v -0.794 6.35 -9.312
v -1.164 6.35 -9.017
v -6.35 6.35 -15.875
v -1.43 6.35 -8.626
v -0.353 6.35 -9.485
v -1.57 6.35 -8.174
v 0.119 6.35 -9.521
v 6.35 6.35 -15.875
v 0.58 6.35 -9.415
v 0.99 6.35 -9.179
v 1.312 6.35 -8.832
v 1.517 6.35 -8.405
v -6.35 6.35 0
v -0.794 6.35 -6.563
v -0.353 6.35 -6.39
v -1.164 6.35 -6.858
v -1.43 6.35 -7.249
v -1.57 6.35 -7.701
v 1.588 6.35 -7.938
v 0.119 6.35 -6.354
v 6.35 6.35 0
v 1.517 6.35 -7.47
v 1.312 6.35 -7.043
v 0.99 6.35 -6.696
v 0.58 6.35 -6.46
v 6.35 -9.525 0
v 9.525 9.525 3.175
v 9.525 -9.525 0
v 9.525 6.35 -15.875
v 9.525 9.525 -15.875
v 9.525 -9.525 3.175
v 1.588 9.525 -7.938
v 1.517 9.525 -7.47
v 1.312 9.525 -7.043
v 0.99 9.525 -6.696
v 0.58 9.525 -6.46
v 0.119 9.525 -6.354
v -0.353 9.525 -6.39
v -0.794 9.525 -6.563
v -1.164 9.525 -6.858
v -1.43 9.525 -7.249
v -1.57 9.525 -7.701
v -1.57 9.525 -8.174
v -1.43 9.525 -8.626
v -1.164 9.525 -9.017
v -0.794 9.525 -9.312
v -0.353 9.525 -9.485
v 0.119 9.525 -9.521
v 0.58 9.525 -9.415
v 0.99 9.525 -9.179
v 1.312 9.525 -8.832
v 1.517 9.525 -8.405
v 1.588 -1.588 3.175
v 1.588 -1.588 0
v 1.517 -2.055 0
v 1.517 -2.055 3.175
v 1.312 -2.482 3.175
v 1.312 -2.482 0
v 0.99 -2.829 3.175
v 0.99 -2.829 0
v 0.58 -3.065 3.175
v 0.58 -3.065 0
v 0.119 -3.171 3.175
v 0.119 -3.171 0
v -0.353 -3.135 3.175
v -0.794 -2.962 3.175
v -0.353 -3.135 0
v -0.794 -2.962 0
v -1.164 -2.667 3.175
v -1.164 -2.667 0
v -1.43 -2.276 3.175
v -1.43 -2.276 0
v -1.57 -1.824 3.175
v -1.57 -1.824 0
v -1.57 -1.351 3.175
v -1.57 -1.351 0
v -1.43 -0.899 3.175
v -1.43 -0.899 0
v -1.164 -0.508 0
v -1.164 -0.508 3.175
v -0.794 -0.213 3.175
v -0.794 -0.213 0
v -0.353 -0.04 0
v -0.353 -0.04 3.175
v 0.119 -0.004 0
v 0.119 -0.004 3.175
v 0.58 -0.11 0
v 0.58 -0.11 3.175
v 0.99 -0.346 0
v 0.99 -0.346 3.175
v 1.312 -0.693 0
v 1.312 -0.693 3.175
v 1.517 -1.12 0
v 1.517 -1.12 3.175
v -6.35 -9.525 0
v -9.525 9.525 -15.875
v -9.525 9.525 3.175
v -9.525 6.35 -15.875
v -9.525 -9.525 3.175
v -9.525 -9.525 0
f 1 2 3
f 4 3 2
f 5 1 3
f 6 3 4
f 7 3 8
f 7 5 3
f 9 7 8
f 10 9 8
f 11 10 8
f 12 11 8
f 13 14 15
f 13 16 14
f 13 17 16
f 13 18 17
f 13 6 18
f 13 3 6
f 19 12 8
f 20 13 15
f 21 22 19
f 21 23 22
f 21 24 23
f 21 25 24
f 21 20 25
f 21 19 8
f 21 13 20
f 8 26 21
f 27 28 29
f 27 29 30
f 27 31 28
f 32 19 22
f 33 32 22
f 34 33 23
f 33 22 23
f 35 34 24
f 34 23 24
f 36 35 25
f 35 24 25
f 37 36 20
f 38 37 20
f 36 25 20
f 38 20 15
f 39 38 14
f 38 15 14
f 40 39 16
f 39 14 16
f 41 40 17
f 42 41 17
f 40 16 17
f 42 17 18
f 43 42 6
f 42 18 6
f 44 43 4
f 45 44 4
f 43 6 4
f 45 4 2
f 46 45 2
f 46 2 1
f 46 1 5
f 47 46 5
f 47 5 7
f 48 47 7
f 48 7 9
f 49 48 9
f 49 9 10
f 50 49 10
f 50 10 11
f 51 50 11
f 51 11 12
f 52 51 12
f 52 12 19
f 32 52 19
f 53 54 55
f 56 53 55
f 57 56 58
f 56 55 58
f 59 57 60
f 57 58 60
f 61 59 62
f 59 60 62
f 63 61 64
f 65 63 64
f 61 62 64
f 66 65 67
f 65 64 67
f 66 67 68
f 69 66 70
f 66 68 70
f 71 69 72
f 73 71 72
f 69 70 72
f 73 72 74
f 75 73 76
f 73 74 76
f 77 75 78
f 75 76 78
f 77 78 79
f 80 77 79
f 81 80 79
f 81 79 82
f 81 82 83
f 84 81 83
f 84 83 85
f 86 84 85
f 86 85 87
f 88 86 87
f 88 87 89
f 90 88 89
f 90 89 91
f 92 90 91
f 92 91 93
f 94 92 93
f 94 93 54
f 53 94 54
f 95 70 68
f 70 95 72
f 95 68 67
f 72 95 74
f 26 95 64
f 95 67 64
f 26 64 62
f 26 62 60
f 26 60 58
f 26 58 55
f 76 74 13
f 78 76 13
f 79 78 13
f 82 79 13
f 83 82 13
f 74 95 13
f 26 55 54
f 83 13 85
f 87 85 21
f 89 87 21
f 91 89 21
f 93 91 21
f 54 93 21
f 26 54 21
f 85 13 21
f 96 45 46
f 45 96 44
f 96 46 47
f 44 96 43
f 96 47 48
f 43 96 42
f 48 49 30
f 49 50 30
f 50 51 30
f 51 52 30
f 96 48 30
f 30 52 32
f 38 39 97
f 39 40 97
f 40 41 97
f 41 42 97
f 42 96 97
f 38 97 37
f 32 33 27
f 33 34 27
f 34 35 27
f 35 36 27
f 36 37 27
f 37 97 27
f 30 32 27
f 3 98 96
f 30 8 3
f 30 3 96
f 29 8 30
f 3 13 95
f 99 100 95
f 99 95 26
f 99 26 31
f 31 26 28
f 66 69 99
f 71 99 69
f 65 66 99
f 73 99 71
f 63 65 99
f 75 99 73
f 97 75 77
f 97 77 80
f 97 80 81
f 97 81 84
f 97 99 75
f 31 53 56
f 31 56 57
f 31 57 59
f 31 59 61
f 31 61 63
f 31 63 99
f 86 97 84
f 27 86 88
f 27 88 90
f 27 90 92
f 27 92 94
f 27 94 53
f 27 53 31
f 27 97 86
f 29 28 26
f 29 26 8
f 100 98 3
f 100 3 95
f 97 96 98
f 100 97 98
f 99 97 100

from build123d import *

# Parameters (mm, degrees)
F0_W      = 19.05
F0_H      = 19.05
F1_DEPTH  = 3.175
F2_W      = 19.05
F2_H      = 3.175
F3_DEPTH  = 15.875
F5_DEPTH  = 3.175
F7_DEPTH  = 3.175
F8_R      = 1.5875
F9_DEPTH  = 3.176
F10_R     = 1.5875
F11_DEPTH = 3.176


with BuildPart() as f1:
    # F0 (on Top) → F1 (new body)
    with BuildSketch(Plane.XY):
        Rectangle(F0_W, F0_H)
    extrude(amount=F1_DEPTH)

    # F2 (on face) → F3 (join)
    with BuildSketch(Plane(origin=(0, 0, 0), x_dir=(1, 0, 0), z_dir=(0, 0, -1))):
        with Locations((0, -7.9375)):
            Rectangle(F2_W, F2_H)
    extrude(amount=F3_DEPTH)

    # F4 (on face) → F5 (join)
    with BuildSketch(Plane(origin=(-9.525, 0, 0), x_dir=(0, -1, 0), z_dir=(-1, 0, 0))):
        Polygon((-6.35, -15.875), (9.525, 0), (-6.35, 0), align=None)
    extrude(amount=-F5_DEPTH)

    # F6 (on face) → F7 (join)
    with BuildSketch(Plane.YZ.offset(9.525)):
        Polygon((-9.525, 0), (6.35, -15.875), (6.35, 0), align=None)
    extrude(amount=-F7_DEPTH)

    # F8 (on face) → F9 (cut, through all)
    with BuildSketch(Plane.XZ.offset(-6.35)):
        with Locations((0, -7.9375)):
            Circle(F8_R)
    extrude(amount=-F9_DEPTH, mode=Mode.SUBTRACT)

    # F10 (on face) → F11 (cut, through all)
    with BuildSketch(Plane(origin=(0, 0, 0), x_dir=(1, 0, 0), z_dir=(0, 0, -1))):
        with Locations((0, 1.5875)):
            Circle(F10_R)
    extrude(amount=-F11_DEPTH, mode=Mode.SUBTRACT)


solid = f1.part
